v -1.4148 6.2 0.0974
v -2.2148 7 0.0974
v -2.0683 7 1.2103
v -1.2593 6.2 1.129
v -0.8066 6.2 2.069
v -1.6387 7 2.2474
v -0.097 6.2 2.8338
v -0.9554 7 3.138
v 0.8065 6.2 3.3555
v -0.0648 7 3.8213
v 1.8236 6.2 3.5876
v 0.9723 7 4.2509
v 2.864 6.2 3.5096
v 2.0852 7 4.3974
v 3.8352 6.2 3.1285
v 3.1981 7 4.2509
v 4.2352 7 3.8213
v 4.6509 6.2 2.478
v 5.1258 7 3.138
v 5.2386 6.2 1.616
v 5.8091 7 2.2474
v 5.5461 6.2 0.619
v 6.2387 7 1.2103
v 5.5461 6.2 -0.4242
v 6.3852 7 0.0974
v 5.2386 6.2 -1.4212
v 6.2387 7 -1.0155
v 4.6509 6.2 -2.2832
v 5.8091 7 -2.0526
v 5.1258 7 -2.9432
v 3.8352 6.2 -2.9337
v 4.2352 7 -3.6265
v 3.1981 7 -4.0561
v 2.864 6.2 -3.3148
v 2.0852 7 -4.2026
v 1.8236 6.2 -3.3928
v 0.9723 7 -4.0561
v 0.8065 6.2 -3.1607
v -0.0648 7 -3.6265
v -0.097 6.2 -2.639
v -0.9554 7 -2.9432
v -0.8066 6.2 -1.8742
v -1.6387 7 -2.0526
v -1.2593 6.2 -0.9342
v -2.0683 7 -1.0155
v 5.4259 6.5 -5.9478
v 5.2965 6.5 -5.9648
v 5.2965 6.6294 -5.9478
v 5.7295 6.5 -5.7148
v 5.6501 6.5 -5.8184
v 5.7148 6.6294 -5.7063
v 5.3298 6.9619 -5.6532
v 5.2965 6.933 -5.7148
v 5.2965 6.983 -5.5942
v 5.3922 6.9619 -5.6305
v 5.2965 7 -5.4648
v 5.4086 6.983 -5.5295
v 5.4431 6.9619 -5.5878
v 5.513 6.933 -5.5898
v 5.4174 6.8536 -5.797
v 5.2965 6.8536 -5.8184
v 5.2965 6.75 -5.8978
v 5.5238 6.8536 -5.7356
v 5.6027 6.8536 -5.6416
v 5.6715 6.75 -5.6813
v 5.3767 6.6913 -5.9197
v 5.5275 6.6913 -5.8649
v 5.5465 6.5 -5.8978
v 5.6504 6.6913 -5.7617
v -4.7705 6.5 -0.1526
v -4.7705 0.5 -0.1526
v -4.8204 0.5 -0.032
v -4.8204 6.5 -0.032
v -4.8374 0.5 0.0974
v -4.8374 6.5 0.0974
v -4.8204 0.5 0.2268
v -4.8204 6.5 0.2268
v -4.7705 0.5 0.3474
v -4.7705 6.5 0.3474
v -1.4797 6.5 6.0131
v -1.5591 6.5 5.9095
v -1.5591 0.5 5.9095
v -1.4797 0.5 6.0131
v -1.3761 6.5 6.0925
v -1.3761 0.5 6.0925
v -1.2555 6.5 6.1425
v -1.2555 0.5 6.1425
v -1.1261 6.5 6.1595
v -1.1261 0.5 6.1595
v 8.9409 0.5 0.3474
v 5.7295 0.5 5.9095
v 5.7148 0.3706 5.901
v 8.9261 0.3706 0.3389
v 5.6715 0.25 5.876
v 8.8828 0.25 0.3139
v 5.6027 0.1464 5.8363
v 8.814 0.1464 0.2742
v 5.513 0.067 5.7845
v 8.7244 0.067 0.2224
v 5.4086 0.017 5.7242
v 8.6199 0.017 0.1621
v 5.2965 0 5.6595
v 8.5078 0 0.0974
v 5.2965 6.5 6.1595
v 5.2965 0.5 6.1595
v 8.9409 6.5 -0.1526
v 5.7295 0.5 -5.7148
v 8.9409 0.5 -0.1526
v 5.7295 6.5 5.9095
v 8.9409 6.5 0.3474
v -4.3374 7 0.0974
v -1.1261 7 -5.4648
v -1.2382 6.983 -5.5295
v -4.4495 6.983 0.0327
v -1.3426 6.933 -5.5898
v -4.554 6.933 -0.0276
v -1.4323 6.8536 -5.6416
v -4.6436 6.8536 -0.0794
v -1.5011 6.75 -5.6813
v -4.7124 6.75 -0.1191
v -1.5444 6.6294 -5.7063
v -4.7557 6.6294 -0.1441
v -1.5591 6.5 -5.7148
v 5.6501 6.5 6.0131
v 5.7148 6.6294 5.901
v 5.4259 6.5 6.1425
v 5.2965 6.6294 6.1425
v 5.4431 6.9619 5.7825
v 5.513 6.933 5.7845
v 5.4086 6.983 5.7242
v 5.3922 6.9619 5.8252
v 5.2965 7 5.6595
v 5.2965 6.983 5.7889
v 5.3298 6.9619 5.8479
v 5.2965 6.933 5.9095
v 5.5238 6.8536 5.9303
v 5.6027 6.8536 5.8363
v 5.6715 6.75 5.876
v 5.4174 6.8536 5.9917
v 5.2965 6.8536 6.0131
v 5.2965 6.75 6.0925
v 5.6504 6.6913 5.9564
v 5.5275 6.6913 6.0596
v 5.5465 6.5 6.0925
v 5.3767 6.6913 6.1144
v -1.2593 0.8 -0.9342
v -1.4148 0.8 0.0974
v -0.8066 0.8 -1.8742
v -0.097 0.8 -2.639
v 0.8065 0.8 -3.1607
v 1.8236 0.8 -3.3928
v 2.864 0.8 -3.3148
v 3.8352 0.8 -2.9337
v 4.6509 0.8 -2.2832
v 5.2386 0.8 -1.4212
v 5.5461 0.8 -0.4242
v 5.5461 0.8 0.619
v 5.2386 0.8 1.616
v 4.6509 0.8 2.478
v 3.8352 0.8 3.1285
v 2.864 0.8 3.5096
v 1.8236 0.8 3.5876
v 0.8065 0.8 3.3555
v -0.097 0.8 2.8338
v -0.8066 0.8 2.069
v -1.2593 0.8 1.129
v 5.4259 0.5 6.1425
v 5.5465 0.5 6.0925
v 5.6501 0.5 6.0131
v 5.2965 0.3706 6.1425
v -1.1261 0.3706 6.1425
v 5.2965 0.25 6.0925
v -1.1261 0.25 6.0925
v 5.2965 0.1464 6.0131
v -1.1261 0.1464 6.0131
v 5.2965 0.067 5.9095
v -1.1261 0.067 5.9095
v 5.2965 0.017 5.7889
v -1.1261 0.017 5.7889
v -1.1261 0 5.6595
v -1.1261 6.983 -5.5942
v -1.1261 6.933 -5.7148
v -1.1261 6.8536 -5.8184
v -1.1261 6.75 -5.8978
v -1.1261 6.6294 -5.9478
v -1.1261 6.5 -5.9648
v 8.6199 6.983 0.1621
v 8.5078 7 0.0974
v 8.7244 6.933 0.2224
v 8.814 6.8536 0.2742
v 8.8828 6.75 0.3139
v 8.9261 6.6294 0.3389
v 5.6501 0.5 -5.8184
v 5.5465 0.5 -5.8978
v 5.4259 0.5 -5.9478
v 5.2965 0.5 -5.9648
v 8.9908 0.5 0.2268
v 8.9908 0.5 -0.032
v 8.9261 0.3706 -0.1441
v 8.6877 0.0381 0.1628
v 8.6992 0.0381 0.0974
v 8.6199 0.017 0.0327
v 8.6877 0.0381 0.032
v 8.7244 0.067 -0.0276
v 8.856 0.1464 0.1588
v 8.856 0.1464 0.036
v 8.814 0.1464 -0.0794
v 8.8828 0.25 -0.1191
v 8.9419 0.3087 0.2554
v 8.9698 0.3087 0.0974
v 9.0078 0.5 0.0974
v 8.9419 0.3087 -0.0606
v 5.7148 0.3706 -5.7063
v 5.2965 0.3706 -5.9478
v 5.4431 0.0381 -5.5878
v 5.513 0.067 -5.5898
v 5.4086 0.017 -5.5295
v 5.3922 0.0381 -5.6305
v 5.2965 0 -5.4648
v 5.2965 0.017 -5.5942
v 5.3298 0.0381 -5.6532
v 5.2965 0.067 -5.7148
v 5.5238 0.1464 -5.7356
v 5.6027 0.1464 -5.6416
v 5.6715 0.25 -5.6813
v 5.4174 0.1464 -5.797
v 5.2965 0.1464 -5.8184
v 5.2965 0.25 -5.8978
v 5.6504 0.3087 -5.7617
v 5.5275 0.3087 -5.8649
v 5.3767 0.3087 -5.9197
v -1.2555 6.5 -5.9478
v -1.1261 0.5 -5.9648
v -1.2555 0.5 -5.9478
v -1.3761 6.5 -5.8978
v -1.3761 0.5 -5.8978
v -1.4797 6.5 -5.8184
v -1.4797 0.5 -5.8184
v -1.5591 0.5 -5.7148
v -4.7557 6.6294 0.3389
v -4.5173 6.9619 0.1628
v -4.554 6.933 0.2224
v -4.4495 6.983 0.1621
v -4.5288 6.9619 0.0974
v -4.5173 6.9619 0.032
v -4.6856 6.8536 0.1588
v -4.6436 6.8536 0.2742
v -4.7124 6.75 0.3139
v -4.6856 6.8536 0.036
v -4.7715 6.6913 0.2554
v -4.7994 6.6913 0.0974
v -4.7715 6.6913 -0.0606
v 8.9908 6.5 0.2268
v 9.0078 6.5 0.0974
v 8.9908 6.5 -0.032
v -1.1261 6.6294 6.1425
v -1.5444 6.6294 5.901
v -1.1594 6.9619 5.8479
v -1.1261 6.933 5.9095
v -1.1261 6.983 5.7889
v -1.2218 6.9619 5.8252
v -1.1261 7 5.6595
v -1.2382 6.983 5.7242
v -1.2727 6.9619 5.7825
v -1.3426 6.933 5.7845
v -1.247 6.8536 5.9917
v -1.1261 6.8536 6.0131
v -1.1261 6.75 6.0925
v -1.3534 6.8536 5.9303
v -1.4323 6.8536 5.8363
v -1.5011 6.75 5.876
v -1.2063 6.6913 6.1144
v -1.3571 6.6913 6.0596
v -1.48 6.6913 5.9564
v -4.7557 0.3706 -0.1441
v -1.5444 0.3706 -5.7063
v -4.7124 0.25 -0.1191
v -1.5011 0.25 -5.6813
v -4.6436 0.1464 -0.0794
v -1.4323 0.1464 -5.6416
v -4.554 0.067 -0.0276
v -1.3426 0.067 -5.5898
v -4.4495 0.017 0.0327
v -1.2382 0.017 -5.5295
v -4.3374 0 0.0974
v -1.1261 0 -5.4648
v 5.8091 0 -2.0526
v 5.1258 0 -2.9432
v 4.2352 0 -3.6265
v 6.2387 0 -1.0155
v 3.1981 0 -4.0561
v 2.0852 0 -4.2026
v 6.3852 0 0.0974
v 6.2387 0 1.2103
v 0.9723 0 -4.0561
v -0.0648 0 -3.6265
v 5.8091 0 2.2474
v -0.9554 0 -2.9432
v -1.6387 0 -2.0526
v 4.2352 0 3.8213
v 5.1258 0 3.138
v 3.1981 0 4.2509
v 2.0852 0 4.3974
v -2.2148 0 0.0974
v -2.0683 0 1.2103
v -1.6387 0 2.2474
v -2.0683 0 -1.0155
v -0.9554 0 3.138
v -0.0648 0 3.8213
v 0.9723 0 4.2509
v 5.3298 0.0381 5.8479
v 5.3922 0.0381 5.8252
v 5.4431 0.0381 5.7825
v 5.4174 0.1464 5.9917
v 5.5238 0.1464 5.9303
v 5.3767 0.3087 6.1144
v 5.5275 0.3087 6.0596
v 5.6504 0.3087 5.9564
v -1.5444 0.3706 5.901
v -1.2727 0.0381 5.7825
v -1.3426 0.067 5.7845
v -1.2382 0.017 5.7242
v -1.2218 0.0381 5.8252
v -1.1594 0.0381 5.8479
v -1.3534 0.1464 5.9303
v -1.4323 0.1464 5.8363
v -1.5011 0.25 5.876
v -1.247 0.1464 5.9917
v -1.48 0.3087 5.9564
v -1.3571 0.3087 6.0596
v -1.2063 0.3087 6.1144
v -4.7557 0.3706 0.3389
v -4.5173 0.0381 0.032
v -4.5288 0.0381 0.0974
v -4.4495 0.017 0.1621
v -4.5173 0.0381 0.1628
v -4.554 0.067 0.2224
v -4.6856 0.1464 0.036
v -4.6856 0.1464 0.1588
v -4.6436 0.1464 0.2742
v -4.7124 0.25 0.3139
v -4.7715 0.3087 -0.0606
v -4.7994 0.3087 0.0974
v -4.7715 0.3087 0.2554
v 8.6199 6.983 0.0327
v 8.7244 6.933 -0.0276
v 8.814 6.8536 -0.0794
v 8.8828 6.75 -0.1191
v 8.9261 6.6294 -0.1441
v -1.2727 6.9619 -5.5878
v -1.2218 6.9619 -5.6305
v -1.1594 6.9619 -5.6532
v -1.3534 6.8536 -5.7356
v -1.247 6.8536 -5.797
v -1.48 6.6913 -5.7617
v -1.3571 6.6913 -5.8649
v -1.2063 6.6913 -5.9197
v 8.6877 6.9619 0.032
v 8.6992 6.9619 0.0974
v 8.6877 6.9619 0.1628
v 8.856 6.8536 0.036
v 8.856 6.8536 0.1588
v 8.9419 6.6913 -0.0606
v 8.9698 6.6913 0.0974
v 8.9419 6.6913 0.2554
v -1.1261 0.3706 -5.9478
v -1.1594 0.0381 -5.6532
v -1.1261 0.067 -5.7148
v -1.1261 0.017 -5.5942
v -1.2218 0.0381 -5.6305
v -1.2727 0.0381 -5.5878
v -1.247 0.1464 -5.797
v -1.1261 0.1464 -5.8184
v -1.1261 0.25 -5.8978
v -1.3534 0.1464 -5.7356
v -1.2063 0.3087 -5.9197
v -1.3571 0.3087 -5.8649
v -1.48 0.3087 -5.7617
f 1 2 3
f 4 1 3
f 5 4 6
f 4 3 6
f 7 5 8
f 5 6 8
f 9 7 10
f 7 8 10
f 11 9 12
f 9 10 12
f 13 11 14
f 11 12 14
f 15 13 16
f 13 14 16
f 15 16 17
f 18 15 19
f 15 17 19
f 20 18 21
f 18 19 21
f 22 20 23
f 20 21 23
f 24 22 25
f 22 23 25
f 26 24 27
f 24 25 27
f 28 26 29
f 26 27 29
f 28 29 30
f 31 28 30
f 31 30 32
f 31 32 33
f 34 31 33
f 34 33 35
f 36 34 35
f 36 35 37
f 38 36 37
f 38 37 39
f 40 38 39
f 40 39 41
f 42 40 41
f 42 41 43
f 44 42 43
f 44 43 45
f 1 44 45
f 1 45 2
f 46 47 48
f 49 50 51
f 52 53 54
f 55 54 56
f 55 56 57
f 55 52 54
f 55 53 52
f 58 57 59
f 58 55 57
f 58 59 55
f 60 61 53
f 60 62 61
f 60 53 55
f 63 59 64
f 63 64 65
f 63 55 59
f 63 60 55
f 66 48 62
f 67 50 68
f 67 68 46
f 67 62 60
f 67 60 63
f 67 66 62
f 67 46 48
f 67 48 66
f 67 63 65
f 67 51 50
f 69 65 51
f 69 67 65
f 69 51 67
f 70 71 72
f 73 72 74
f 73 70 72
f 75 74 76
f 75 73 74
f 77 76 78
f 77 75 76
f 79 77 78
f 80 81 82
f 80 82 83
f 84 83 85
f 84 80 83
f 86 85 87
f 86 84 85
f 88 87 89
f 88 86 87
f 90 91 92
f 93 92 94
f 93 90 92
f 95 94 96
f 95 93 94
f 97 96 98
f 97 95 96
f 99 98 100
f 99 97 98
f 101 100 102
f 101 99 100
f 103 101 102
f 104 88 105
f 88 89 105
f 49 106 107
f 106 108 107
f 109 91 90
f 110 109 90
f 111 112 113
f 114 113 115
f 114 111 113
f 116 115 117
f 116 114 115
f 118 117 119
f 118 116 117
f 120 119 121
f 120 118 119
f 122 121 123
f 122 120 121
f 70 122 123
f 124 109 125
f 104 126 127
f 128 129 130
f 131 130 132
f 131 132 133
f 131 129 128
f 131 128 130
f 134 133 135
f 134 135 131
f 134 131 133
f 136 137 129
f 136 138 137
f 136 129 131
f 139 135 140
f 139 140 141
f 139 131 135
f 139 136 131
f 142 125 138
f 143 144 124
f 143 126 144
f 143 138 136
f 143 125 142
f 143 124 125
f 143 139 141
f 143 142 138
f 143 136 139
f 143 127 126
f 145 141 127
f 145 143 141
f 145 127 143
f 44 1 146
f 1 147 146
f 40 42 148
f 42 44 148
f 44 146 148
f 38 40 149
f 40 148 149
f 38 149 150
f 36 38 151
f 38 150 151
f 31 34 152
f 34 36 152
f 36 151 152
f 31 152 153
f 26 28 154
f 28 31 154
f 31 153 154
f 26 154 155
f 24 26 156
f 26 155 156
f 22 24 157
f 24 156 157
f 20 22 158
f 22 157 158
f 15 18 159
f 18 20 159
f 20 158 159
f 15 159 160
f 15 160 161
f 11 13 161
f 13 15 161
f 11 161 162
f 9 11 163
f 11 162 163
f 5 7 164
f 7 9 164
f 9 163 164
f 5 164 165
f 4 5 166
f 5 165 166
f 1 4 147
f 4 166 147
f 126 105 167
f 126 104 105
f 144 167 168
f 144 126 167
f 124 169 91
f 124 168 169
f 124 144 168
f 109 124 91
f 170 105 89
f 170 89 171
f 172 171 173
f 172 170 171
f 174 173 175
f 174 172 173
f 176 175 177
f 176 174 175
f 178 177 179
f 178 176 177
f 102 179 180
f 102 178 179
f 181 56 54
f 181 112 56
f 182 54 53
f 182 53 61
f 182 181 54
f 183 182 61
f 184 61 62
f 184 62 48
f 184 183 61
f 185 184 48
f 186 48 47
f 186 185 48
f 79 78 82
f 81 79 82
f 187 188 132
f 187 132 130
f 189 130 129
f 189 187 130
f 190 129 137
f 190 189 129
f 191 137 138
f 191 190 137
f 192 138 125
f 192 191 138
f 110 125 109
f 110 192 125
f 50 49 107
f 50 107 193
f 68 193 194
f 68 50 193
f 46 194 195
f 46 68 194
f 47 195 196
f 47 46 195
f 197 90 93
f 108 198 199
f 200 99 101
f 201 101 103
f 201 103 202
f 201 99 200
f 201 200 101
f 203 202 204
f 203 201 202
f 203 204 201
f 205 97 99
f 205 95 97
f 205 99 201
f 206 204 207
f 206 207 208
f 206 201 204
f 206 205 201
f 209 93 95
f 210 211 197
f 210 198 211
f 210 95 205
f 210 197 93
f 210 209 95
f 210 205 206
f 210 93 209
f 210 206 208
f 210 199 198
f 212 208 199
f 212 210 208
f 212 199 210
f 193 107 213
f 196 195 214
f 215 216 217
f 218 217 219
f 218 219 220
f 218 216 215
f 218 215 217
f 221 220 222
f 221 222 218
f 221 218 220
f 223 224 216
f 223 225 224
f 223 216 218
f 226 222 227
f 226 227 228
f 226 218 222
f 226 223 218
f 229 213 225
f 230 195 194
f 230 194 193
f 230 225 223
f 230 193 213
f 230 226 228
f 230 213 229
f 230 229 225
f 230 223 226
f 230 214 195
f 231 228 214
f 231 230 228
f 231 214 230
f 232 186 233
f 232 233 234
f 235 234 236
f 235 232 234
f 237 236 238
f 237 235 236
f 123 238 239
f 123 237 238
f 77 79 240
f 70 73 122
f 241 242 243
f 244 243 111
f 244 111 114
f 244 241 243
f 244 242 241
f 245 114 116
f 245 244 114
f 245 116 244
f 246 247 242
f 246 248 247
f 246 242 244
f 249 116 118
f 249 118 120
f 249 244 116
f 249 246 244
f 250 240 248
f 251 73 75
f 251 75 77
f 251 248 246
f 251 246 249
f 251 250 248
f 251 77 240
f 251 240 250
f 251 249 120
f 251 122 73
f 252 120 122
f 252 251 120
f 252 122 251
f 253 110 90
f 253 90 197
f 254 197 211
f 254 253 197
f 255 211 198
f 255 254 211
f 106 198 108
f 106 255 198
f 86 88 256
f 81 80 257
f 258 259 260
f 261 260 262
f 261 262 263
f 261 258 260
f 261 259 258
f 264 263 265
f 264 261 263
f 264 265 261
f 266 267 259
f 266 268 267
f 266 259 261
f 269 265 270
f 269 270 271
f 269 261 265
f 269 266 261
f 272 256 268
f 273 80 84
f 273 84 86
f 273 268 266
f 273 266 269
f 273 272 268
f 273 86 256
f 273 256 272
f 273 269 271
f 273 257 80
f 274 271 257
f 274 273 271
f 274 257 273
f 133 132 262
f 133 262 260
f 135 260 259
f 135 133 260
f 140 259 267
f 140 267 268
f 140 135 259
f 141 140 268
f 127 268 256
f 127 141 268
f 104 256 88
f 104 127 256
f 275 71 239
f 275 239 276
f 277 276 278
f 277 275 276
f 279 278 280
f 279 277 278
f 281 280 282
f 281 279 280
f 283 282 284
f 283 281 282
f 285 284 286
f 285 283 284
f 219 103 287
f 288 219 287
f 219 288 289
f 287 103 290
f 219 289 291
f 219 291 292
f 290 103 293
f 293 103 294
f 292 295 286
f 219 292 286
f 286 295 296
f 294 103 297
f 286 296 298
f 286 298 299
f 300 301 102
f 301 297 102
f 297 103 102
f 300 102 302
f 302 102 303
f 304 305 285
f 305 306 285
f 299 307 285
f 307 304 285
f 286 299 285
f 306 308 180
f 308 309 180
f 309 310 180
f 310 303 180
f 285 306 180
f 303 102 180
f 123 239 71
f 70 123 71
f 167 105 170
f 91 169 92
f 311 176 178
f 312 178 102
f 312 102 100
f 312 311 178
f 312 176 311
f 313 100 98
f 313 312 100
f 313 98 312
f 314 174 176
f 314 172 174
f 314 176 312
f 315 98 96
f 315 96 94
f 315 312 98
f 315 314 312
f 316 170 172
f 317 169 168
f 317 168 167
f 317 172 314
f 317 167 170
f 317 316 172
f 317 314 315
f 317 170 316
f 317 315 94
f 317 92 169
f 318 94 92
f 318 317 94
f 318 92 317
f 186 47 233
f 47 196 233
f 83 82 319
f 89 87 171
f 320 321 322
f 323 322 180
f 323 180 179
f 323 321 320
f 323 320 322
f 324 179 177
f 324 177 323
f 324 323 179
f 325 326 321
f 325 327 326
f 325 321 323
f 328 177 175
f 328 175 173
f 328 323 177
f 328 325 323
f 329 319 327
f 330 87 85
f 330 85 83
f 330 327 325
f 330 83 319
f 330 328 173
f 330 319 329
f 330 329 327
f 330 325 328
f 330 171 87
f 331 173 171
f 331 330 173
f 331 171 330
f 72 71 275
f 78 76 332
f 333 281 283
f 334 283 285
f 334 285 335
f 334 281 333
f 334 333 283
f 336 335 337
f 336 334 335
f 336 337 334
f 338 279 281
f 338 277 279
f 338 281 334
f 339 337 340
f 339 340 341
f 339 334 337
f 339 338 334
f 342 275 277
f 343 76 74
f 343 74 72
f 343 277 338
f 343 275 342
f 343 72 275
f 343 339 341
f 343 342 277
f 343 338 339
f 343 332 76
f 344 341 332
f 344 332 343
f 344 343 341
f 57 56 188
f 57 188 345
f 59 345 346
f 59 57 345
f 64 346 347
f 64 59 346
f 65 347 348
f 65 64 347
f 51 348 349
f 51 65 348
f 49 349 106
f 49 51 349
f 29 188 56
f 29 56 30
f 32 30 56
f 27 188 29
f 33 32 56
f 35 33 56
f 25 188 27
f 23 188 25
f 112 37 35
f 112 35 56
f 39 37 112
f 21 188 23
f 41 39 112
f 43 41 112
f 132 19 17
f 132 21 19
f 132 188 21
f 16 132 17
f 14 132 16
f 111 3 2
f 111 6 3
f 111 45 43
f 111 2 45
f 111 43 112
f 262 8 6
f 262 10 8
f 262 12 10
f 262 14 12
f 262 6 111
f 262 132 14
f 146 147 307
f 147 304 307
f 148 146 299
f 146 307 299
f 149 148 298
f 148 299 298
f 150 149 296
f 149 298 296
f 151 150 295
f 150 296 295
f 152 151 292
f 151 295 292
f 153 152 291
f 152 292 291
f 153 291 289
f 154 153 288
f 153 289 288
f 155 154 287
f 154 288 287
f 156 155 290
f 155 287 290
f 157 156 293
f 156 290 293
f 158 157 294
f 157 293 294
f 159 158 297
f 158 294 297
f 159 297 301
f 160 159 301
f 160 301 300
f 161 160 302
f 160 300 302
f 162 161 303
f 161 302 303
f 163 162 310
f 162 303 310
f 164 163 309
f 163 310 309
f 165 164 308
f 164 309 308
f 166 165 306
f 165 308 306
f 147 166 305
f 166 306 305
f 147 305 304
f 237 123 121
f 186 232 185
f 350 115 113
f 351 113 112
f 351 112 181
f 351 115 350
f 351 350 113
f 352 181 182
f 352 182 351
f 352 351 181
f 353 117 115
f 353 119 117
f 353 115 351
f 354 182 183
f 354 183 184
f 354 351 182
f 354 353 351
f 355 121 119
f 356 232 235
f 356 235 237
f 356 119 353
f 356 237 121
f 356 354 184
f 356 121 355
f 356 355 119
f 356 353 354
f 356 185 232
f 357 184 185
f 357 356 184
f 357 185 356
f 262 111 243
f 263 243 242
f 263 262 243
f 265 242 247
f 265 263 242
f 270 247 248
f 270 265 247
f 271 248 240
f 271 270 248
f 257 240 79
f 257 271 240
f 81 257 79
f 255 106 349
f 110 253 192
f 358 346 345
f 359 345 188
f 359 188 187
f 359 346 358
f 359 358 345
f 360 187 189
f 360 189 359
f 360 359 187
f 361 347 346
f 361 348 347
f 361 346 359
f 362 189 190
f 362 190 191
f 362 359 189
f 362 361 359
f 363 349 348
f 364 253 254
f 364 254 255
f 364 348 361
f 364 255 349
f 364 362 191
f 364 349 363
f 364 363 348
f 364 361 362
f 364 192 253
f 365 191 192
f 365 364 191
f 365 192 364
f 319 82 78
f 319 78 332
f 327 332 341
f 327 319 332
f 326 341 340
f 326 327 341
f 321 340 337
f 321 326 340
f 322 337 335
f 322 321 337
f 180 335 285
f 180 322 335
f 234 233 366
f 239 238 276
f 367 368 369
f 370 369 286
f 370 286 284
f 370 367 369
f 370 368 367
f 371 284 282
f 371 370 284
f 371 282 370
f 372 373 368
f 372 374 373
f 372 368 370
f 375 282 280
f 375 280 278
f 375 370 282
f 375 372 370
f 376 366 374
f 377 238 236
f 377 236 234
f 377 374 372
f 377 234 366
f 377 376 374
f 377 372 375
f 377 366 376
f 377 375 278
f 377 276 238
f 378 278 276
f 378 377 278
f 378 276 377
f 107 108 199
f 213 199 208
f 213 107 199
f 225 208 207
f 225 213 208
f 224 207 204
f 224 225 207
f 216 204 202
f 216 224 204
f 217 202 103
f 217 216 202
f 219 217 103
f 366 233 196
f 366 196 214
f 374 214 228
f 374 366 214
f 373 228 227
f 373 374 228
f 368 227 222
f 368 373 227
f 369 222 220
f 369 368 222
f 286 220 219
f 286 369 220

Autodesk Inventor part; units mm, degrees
ref_plane "YZ Plane" through (0, 0, 0) normal (1, 0, 0) x (0, 1, 0)
ref_plane "XZ Plane" through (0, 0, 0) normal (0, 1, 0) x (-1, 0, 0)
ref_plane "XY Plane" through (0, 0, 0) normal (0, 0, 1) x (1, 0, 0)
sketch "Boceto1" plane through (0, 0, 0) normal (0, 1, 0) x (-1, 0, 0)
  line L0 (-5.5852, -5.9648) -> (1.4148, -5.9648)
  line L1 (1.4148, -5.9648) -> (4.9148, 0.0974)
  line L2 (4.9148, 0.0974) -> (1.4148, 6.1595)
  line L3 (1.4148, 6.1595) -> (-5.5852, 6.1595)
  line L4 (-5.5852, 6.1595) -> (-9.0852, 0.0974)
  line L5 (-9.0852, 0.0974) -> (-5.5852, -5.9648)
  circle A0 centre (-2.0852, 0.0974) radius 3.5
  dimension "d21" = 7
  dimension "d22" = 7
  dimension "d23" = 120
  dimension "d24" = 7
  dimension "d25" = 7
  dimension "d26" = 7
  dimension "d27" = 120
  dimension "d28" = 7
extrude "Extrusión1" add sketch "Boceto1" along normal blind 7
thread "Rosca1" size "M7x1" class "6H" standard "ANSI Metric M Profile" full length
fillet "Empalme1" radius 0.5 18 edges at (-1.4148, 3.5, 6.1595) (-4.9148, 3.5, 0.0974) (-1.4148, 3.5, -5.9648) (5.5852, 3.5, -5.9648) (9.0852, 3.5, 0.0974) (5.5852, 3.5, 6.1595) (7.3352, 0, 3.1284) (2.0852, 0, 6.1595) (-3.1648, 0, 3.1284) (-3.1648, 0, -2.9337) (2.0852, 0, -5.9648) (7.3352, 0, -2.9337) (7.3352, 7, 3.1284) (7.3352, 7, -2.9337) (2.0852, 7, -5.9648) (-3.1648, 7, -2.9337) (-3.1648, 7, 3.1284) (2.0852, 7, 6.1595)
chamfer "Chaflán1" distance 0.8 angle 45 2 edges at (5.5852, 7, 0.0974) (5.5852, 0, 0.0974)
thread "Rosca2" size "Rc 1/16" standard "ISO Taper Internal" full length
thread "Rosca3" size "Rc 1/16" standard "ISO Taper Internal" full length
properties material "Acero"
